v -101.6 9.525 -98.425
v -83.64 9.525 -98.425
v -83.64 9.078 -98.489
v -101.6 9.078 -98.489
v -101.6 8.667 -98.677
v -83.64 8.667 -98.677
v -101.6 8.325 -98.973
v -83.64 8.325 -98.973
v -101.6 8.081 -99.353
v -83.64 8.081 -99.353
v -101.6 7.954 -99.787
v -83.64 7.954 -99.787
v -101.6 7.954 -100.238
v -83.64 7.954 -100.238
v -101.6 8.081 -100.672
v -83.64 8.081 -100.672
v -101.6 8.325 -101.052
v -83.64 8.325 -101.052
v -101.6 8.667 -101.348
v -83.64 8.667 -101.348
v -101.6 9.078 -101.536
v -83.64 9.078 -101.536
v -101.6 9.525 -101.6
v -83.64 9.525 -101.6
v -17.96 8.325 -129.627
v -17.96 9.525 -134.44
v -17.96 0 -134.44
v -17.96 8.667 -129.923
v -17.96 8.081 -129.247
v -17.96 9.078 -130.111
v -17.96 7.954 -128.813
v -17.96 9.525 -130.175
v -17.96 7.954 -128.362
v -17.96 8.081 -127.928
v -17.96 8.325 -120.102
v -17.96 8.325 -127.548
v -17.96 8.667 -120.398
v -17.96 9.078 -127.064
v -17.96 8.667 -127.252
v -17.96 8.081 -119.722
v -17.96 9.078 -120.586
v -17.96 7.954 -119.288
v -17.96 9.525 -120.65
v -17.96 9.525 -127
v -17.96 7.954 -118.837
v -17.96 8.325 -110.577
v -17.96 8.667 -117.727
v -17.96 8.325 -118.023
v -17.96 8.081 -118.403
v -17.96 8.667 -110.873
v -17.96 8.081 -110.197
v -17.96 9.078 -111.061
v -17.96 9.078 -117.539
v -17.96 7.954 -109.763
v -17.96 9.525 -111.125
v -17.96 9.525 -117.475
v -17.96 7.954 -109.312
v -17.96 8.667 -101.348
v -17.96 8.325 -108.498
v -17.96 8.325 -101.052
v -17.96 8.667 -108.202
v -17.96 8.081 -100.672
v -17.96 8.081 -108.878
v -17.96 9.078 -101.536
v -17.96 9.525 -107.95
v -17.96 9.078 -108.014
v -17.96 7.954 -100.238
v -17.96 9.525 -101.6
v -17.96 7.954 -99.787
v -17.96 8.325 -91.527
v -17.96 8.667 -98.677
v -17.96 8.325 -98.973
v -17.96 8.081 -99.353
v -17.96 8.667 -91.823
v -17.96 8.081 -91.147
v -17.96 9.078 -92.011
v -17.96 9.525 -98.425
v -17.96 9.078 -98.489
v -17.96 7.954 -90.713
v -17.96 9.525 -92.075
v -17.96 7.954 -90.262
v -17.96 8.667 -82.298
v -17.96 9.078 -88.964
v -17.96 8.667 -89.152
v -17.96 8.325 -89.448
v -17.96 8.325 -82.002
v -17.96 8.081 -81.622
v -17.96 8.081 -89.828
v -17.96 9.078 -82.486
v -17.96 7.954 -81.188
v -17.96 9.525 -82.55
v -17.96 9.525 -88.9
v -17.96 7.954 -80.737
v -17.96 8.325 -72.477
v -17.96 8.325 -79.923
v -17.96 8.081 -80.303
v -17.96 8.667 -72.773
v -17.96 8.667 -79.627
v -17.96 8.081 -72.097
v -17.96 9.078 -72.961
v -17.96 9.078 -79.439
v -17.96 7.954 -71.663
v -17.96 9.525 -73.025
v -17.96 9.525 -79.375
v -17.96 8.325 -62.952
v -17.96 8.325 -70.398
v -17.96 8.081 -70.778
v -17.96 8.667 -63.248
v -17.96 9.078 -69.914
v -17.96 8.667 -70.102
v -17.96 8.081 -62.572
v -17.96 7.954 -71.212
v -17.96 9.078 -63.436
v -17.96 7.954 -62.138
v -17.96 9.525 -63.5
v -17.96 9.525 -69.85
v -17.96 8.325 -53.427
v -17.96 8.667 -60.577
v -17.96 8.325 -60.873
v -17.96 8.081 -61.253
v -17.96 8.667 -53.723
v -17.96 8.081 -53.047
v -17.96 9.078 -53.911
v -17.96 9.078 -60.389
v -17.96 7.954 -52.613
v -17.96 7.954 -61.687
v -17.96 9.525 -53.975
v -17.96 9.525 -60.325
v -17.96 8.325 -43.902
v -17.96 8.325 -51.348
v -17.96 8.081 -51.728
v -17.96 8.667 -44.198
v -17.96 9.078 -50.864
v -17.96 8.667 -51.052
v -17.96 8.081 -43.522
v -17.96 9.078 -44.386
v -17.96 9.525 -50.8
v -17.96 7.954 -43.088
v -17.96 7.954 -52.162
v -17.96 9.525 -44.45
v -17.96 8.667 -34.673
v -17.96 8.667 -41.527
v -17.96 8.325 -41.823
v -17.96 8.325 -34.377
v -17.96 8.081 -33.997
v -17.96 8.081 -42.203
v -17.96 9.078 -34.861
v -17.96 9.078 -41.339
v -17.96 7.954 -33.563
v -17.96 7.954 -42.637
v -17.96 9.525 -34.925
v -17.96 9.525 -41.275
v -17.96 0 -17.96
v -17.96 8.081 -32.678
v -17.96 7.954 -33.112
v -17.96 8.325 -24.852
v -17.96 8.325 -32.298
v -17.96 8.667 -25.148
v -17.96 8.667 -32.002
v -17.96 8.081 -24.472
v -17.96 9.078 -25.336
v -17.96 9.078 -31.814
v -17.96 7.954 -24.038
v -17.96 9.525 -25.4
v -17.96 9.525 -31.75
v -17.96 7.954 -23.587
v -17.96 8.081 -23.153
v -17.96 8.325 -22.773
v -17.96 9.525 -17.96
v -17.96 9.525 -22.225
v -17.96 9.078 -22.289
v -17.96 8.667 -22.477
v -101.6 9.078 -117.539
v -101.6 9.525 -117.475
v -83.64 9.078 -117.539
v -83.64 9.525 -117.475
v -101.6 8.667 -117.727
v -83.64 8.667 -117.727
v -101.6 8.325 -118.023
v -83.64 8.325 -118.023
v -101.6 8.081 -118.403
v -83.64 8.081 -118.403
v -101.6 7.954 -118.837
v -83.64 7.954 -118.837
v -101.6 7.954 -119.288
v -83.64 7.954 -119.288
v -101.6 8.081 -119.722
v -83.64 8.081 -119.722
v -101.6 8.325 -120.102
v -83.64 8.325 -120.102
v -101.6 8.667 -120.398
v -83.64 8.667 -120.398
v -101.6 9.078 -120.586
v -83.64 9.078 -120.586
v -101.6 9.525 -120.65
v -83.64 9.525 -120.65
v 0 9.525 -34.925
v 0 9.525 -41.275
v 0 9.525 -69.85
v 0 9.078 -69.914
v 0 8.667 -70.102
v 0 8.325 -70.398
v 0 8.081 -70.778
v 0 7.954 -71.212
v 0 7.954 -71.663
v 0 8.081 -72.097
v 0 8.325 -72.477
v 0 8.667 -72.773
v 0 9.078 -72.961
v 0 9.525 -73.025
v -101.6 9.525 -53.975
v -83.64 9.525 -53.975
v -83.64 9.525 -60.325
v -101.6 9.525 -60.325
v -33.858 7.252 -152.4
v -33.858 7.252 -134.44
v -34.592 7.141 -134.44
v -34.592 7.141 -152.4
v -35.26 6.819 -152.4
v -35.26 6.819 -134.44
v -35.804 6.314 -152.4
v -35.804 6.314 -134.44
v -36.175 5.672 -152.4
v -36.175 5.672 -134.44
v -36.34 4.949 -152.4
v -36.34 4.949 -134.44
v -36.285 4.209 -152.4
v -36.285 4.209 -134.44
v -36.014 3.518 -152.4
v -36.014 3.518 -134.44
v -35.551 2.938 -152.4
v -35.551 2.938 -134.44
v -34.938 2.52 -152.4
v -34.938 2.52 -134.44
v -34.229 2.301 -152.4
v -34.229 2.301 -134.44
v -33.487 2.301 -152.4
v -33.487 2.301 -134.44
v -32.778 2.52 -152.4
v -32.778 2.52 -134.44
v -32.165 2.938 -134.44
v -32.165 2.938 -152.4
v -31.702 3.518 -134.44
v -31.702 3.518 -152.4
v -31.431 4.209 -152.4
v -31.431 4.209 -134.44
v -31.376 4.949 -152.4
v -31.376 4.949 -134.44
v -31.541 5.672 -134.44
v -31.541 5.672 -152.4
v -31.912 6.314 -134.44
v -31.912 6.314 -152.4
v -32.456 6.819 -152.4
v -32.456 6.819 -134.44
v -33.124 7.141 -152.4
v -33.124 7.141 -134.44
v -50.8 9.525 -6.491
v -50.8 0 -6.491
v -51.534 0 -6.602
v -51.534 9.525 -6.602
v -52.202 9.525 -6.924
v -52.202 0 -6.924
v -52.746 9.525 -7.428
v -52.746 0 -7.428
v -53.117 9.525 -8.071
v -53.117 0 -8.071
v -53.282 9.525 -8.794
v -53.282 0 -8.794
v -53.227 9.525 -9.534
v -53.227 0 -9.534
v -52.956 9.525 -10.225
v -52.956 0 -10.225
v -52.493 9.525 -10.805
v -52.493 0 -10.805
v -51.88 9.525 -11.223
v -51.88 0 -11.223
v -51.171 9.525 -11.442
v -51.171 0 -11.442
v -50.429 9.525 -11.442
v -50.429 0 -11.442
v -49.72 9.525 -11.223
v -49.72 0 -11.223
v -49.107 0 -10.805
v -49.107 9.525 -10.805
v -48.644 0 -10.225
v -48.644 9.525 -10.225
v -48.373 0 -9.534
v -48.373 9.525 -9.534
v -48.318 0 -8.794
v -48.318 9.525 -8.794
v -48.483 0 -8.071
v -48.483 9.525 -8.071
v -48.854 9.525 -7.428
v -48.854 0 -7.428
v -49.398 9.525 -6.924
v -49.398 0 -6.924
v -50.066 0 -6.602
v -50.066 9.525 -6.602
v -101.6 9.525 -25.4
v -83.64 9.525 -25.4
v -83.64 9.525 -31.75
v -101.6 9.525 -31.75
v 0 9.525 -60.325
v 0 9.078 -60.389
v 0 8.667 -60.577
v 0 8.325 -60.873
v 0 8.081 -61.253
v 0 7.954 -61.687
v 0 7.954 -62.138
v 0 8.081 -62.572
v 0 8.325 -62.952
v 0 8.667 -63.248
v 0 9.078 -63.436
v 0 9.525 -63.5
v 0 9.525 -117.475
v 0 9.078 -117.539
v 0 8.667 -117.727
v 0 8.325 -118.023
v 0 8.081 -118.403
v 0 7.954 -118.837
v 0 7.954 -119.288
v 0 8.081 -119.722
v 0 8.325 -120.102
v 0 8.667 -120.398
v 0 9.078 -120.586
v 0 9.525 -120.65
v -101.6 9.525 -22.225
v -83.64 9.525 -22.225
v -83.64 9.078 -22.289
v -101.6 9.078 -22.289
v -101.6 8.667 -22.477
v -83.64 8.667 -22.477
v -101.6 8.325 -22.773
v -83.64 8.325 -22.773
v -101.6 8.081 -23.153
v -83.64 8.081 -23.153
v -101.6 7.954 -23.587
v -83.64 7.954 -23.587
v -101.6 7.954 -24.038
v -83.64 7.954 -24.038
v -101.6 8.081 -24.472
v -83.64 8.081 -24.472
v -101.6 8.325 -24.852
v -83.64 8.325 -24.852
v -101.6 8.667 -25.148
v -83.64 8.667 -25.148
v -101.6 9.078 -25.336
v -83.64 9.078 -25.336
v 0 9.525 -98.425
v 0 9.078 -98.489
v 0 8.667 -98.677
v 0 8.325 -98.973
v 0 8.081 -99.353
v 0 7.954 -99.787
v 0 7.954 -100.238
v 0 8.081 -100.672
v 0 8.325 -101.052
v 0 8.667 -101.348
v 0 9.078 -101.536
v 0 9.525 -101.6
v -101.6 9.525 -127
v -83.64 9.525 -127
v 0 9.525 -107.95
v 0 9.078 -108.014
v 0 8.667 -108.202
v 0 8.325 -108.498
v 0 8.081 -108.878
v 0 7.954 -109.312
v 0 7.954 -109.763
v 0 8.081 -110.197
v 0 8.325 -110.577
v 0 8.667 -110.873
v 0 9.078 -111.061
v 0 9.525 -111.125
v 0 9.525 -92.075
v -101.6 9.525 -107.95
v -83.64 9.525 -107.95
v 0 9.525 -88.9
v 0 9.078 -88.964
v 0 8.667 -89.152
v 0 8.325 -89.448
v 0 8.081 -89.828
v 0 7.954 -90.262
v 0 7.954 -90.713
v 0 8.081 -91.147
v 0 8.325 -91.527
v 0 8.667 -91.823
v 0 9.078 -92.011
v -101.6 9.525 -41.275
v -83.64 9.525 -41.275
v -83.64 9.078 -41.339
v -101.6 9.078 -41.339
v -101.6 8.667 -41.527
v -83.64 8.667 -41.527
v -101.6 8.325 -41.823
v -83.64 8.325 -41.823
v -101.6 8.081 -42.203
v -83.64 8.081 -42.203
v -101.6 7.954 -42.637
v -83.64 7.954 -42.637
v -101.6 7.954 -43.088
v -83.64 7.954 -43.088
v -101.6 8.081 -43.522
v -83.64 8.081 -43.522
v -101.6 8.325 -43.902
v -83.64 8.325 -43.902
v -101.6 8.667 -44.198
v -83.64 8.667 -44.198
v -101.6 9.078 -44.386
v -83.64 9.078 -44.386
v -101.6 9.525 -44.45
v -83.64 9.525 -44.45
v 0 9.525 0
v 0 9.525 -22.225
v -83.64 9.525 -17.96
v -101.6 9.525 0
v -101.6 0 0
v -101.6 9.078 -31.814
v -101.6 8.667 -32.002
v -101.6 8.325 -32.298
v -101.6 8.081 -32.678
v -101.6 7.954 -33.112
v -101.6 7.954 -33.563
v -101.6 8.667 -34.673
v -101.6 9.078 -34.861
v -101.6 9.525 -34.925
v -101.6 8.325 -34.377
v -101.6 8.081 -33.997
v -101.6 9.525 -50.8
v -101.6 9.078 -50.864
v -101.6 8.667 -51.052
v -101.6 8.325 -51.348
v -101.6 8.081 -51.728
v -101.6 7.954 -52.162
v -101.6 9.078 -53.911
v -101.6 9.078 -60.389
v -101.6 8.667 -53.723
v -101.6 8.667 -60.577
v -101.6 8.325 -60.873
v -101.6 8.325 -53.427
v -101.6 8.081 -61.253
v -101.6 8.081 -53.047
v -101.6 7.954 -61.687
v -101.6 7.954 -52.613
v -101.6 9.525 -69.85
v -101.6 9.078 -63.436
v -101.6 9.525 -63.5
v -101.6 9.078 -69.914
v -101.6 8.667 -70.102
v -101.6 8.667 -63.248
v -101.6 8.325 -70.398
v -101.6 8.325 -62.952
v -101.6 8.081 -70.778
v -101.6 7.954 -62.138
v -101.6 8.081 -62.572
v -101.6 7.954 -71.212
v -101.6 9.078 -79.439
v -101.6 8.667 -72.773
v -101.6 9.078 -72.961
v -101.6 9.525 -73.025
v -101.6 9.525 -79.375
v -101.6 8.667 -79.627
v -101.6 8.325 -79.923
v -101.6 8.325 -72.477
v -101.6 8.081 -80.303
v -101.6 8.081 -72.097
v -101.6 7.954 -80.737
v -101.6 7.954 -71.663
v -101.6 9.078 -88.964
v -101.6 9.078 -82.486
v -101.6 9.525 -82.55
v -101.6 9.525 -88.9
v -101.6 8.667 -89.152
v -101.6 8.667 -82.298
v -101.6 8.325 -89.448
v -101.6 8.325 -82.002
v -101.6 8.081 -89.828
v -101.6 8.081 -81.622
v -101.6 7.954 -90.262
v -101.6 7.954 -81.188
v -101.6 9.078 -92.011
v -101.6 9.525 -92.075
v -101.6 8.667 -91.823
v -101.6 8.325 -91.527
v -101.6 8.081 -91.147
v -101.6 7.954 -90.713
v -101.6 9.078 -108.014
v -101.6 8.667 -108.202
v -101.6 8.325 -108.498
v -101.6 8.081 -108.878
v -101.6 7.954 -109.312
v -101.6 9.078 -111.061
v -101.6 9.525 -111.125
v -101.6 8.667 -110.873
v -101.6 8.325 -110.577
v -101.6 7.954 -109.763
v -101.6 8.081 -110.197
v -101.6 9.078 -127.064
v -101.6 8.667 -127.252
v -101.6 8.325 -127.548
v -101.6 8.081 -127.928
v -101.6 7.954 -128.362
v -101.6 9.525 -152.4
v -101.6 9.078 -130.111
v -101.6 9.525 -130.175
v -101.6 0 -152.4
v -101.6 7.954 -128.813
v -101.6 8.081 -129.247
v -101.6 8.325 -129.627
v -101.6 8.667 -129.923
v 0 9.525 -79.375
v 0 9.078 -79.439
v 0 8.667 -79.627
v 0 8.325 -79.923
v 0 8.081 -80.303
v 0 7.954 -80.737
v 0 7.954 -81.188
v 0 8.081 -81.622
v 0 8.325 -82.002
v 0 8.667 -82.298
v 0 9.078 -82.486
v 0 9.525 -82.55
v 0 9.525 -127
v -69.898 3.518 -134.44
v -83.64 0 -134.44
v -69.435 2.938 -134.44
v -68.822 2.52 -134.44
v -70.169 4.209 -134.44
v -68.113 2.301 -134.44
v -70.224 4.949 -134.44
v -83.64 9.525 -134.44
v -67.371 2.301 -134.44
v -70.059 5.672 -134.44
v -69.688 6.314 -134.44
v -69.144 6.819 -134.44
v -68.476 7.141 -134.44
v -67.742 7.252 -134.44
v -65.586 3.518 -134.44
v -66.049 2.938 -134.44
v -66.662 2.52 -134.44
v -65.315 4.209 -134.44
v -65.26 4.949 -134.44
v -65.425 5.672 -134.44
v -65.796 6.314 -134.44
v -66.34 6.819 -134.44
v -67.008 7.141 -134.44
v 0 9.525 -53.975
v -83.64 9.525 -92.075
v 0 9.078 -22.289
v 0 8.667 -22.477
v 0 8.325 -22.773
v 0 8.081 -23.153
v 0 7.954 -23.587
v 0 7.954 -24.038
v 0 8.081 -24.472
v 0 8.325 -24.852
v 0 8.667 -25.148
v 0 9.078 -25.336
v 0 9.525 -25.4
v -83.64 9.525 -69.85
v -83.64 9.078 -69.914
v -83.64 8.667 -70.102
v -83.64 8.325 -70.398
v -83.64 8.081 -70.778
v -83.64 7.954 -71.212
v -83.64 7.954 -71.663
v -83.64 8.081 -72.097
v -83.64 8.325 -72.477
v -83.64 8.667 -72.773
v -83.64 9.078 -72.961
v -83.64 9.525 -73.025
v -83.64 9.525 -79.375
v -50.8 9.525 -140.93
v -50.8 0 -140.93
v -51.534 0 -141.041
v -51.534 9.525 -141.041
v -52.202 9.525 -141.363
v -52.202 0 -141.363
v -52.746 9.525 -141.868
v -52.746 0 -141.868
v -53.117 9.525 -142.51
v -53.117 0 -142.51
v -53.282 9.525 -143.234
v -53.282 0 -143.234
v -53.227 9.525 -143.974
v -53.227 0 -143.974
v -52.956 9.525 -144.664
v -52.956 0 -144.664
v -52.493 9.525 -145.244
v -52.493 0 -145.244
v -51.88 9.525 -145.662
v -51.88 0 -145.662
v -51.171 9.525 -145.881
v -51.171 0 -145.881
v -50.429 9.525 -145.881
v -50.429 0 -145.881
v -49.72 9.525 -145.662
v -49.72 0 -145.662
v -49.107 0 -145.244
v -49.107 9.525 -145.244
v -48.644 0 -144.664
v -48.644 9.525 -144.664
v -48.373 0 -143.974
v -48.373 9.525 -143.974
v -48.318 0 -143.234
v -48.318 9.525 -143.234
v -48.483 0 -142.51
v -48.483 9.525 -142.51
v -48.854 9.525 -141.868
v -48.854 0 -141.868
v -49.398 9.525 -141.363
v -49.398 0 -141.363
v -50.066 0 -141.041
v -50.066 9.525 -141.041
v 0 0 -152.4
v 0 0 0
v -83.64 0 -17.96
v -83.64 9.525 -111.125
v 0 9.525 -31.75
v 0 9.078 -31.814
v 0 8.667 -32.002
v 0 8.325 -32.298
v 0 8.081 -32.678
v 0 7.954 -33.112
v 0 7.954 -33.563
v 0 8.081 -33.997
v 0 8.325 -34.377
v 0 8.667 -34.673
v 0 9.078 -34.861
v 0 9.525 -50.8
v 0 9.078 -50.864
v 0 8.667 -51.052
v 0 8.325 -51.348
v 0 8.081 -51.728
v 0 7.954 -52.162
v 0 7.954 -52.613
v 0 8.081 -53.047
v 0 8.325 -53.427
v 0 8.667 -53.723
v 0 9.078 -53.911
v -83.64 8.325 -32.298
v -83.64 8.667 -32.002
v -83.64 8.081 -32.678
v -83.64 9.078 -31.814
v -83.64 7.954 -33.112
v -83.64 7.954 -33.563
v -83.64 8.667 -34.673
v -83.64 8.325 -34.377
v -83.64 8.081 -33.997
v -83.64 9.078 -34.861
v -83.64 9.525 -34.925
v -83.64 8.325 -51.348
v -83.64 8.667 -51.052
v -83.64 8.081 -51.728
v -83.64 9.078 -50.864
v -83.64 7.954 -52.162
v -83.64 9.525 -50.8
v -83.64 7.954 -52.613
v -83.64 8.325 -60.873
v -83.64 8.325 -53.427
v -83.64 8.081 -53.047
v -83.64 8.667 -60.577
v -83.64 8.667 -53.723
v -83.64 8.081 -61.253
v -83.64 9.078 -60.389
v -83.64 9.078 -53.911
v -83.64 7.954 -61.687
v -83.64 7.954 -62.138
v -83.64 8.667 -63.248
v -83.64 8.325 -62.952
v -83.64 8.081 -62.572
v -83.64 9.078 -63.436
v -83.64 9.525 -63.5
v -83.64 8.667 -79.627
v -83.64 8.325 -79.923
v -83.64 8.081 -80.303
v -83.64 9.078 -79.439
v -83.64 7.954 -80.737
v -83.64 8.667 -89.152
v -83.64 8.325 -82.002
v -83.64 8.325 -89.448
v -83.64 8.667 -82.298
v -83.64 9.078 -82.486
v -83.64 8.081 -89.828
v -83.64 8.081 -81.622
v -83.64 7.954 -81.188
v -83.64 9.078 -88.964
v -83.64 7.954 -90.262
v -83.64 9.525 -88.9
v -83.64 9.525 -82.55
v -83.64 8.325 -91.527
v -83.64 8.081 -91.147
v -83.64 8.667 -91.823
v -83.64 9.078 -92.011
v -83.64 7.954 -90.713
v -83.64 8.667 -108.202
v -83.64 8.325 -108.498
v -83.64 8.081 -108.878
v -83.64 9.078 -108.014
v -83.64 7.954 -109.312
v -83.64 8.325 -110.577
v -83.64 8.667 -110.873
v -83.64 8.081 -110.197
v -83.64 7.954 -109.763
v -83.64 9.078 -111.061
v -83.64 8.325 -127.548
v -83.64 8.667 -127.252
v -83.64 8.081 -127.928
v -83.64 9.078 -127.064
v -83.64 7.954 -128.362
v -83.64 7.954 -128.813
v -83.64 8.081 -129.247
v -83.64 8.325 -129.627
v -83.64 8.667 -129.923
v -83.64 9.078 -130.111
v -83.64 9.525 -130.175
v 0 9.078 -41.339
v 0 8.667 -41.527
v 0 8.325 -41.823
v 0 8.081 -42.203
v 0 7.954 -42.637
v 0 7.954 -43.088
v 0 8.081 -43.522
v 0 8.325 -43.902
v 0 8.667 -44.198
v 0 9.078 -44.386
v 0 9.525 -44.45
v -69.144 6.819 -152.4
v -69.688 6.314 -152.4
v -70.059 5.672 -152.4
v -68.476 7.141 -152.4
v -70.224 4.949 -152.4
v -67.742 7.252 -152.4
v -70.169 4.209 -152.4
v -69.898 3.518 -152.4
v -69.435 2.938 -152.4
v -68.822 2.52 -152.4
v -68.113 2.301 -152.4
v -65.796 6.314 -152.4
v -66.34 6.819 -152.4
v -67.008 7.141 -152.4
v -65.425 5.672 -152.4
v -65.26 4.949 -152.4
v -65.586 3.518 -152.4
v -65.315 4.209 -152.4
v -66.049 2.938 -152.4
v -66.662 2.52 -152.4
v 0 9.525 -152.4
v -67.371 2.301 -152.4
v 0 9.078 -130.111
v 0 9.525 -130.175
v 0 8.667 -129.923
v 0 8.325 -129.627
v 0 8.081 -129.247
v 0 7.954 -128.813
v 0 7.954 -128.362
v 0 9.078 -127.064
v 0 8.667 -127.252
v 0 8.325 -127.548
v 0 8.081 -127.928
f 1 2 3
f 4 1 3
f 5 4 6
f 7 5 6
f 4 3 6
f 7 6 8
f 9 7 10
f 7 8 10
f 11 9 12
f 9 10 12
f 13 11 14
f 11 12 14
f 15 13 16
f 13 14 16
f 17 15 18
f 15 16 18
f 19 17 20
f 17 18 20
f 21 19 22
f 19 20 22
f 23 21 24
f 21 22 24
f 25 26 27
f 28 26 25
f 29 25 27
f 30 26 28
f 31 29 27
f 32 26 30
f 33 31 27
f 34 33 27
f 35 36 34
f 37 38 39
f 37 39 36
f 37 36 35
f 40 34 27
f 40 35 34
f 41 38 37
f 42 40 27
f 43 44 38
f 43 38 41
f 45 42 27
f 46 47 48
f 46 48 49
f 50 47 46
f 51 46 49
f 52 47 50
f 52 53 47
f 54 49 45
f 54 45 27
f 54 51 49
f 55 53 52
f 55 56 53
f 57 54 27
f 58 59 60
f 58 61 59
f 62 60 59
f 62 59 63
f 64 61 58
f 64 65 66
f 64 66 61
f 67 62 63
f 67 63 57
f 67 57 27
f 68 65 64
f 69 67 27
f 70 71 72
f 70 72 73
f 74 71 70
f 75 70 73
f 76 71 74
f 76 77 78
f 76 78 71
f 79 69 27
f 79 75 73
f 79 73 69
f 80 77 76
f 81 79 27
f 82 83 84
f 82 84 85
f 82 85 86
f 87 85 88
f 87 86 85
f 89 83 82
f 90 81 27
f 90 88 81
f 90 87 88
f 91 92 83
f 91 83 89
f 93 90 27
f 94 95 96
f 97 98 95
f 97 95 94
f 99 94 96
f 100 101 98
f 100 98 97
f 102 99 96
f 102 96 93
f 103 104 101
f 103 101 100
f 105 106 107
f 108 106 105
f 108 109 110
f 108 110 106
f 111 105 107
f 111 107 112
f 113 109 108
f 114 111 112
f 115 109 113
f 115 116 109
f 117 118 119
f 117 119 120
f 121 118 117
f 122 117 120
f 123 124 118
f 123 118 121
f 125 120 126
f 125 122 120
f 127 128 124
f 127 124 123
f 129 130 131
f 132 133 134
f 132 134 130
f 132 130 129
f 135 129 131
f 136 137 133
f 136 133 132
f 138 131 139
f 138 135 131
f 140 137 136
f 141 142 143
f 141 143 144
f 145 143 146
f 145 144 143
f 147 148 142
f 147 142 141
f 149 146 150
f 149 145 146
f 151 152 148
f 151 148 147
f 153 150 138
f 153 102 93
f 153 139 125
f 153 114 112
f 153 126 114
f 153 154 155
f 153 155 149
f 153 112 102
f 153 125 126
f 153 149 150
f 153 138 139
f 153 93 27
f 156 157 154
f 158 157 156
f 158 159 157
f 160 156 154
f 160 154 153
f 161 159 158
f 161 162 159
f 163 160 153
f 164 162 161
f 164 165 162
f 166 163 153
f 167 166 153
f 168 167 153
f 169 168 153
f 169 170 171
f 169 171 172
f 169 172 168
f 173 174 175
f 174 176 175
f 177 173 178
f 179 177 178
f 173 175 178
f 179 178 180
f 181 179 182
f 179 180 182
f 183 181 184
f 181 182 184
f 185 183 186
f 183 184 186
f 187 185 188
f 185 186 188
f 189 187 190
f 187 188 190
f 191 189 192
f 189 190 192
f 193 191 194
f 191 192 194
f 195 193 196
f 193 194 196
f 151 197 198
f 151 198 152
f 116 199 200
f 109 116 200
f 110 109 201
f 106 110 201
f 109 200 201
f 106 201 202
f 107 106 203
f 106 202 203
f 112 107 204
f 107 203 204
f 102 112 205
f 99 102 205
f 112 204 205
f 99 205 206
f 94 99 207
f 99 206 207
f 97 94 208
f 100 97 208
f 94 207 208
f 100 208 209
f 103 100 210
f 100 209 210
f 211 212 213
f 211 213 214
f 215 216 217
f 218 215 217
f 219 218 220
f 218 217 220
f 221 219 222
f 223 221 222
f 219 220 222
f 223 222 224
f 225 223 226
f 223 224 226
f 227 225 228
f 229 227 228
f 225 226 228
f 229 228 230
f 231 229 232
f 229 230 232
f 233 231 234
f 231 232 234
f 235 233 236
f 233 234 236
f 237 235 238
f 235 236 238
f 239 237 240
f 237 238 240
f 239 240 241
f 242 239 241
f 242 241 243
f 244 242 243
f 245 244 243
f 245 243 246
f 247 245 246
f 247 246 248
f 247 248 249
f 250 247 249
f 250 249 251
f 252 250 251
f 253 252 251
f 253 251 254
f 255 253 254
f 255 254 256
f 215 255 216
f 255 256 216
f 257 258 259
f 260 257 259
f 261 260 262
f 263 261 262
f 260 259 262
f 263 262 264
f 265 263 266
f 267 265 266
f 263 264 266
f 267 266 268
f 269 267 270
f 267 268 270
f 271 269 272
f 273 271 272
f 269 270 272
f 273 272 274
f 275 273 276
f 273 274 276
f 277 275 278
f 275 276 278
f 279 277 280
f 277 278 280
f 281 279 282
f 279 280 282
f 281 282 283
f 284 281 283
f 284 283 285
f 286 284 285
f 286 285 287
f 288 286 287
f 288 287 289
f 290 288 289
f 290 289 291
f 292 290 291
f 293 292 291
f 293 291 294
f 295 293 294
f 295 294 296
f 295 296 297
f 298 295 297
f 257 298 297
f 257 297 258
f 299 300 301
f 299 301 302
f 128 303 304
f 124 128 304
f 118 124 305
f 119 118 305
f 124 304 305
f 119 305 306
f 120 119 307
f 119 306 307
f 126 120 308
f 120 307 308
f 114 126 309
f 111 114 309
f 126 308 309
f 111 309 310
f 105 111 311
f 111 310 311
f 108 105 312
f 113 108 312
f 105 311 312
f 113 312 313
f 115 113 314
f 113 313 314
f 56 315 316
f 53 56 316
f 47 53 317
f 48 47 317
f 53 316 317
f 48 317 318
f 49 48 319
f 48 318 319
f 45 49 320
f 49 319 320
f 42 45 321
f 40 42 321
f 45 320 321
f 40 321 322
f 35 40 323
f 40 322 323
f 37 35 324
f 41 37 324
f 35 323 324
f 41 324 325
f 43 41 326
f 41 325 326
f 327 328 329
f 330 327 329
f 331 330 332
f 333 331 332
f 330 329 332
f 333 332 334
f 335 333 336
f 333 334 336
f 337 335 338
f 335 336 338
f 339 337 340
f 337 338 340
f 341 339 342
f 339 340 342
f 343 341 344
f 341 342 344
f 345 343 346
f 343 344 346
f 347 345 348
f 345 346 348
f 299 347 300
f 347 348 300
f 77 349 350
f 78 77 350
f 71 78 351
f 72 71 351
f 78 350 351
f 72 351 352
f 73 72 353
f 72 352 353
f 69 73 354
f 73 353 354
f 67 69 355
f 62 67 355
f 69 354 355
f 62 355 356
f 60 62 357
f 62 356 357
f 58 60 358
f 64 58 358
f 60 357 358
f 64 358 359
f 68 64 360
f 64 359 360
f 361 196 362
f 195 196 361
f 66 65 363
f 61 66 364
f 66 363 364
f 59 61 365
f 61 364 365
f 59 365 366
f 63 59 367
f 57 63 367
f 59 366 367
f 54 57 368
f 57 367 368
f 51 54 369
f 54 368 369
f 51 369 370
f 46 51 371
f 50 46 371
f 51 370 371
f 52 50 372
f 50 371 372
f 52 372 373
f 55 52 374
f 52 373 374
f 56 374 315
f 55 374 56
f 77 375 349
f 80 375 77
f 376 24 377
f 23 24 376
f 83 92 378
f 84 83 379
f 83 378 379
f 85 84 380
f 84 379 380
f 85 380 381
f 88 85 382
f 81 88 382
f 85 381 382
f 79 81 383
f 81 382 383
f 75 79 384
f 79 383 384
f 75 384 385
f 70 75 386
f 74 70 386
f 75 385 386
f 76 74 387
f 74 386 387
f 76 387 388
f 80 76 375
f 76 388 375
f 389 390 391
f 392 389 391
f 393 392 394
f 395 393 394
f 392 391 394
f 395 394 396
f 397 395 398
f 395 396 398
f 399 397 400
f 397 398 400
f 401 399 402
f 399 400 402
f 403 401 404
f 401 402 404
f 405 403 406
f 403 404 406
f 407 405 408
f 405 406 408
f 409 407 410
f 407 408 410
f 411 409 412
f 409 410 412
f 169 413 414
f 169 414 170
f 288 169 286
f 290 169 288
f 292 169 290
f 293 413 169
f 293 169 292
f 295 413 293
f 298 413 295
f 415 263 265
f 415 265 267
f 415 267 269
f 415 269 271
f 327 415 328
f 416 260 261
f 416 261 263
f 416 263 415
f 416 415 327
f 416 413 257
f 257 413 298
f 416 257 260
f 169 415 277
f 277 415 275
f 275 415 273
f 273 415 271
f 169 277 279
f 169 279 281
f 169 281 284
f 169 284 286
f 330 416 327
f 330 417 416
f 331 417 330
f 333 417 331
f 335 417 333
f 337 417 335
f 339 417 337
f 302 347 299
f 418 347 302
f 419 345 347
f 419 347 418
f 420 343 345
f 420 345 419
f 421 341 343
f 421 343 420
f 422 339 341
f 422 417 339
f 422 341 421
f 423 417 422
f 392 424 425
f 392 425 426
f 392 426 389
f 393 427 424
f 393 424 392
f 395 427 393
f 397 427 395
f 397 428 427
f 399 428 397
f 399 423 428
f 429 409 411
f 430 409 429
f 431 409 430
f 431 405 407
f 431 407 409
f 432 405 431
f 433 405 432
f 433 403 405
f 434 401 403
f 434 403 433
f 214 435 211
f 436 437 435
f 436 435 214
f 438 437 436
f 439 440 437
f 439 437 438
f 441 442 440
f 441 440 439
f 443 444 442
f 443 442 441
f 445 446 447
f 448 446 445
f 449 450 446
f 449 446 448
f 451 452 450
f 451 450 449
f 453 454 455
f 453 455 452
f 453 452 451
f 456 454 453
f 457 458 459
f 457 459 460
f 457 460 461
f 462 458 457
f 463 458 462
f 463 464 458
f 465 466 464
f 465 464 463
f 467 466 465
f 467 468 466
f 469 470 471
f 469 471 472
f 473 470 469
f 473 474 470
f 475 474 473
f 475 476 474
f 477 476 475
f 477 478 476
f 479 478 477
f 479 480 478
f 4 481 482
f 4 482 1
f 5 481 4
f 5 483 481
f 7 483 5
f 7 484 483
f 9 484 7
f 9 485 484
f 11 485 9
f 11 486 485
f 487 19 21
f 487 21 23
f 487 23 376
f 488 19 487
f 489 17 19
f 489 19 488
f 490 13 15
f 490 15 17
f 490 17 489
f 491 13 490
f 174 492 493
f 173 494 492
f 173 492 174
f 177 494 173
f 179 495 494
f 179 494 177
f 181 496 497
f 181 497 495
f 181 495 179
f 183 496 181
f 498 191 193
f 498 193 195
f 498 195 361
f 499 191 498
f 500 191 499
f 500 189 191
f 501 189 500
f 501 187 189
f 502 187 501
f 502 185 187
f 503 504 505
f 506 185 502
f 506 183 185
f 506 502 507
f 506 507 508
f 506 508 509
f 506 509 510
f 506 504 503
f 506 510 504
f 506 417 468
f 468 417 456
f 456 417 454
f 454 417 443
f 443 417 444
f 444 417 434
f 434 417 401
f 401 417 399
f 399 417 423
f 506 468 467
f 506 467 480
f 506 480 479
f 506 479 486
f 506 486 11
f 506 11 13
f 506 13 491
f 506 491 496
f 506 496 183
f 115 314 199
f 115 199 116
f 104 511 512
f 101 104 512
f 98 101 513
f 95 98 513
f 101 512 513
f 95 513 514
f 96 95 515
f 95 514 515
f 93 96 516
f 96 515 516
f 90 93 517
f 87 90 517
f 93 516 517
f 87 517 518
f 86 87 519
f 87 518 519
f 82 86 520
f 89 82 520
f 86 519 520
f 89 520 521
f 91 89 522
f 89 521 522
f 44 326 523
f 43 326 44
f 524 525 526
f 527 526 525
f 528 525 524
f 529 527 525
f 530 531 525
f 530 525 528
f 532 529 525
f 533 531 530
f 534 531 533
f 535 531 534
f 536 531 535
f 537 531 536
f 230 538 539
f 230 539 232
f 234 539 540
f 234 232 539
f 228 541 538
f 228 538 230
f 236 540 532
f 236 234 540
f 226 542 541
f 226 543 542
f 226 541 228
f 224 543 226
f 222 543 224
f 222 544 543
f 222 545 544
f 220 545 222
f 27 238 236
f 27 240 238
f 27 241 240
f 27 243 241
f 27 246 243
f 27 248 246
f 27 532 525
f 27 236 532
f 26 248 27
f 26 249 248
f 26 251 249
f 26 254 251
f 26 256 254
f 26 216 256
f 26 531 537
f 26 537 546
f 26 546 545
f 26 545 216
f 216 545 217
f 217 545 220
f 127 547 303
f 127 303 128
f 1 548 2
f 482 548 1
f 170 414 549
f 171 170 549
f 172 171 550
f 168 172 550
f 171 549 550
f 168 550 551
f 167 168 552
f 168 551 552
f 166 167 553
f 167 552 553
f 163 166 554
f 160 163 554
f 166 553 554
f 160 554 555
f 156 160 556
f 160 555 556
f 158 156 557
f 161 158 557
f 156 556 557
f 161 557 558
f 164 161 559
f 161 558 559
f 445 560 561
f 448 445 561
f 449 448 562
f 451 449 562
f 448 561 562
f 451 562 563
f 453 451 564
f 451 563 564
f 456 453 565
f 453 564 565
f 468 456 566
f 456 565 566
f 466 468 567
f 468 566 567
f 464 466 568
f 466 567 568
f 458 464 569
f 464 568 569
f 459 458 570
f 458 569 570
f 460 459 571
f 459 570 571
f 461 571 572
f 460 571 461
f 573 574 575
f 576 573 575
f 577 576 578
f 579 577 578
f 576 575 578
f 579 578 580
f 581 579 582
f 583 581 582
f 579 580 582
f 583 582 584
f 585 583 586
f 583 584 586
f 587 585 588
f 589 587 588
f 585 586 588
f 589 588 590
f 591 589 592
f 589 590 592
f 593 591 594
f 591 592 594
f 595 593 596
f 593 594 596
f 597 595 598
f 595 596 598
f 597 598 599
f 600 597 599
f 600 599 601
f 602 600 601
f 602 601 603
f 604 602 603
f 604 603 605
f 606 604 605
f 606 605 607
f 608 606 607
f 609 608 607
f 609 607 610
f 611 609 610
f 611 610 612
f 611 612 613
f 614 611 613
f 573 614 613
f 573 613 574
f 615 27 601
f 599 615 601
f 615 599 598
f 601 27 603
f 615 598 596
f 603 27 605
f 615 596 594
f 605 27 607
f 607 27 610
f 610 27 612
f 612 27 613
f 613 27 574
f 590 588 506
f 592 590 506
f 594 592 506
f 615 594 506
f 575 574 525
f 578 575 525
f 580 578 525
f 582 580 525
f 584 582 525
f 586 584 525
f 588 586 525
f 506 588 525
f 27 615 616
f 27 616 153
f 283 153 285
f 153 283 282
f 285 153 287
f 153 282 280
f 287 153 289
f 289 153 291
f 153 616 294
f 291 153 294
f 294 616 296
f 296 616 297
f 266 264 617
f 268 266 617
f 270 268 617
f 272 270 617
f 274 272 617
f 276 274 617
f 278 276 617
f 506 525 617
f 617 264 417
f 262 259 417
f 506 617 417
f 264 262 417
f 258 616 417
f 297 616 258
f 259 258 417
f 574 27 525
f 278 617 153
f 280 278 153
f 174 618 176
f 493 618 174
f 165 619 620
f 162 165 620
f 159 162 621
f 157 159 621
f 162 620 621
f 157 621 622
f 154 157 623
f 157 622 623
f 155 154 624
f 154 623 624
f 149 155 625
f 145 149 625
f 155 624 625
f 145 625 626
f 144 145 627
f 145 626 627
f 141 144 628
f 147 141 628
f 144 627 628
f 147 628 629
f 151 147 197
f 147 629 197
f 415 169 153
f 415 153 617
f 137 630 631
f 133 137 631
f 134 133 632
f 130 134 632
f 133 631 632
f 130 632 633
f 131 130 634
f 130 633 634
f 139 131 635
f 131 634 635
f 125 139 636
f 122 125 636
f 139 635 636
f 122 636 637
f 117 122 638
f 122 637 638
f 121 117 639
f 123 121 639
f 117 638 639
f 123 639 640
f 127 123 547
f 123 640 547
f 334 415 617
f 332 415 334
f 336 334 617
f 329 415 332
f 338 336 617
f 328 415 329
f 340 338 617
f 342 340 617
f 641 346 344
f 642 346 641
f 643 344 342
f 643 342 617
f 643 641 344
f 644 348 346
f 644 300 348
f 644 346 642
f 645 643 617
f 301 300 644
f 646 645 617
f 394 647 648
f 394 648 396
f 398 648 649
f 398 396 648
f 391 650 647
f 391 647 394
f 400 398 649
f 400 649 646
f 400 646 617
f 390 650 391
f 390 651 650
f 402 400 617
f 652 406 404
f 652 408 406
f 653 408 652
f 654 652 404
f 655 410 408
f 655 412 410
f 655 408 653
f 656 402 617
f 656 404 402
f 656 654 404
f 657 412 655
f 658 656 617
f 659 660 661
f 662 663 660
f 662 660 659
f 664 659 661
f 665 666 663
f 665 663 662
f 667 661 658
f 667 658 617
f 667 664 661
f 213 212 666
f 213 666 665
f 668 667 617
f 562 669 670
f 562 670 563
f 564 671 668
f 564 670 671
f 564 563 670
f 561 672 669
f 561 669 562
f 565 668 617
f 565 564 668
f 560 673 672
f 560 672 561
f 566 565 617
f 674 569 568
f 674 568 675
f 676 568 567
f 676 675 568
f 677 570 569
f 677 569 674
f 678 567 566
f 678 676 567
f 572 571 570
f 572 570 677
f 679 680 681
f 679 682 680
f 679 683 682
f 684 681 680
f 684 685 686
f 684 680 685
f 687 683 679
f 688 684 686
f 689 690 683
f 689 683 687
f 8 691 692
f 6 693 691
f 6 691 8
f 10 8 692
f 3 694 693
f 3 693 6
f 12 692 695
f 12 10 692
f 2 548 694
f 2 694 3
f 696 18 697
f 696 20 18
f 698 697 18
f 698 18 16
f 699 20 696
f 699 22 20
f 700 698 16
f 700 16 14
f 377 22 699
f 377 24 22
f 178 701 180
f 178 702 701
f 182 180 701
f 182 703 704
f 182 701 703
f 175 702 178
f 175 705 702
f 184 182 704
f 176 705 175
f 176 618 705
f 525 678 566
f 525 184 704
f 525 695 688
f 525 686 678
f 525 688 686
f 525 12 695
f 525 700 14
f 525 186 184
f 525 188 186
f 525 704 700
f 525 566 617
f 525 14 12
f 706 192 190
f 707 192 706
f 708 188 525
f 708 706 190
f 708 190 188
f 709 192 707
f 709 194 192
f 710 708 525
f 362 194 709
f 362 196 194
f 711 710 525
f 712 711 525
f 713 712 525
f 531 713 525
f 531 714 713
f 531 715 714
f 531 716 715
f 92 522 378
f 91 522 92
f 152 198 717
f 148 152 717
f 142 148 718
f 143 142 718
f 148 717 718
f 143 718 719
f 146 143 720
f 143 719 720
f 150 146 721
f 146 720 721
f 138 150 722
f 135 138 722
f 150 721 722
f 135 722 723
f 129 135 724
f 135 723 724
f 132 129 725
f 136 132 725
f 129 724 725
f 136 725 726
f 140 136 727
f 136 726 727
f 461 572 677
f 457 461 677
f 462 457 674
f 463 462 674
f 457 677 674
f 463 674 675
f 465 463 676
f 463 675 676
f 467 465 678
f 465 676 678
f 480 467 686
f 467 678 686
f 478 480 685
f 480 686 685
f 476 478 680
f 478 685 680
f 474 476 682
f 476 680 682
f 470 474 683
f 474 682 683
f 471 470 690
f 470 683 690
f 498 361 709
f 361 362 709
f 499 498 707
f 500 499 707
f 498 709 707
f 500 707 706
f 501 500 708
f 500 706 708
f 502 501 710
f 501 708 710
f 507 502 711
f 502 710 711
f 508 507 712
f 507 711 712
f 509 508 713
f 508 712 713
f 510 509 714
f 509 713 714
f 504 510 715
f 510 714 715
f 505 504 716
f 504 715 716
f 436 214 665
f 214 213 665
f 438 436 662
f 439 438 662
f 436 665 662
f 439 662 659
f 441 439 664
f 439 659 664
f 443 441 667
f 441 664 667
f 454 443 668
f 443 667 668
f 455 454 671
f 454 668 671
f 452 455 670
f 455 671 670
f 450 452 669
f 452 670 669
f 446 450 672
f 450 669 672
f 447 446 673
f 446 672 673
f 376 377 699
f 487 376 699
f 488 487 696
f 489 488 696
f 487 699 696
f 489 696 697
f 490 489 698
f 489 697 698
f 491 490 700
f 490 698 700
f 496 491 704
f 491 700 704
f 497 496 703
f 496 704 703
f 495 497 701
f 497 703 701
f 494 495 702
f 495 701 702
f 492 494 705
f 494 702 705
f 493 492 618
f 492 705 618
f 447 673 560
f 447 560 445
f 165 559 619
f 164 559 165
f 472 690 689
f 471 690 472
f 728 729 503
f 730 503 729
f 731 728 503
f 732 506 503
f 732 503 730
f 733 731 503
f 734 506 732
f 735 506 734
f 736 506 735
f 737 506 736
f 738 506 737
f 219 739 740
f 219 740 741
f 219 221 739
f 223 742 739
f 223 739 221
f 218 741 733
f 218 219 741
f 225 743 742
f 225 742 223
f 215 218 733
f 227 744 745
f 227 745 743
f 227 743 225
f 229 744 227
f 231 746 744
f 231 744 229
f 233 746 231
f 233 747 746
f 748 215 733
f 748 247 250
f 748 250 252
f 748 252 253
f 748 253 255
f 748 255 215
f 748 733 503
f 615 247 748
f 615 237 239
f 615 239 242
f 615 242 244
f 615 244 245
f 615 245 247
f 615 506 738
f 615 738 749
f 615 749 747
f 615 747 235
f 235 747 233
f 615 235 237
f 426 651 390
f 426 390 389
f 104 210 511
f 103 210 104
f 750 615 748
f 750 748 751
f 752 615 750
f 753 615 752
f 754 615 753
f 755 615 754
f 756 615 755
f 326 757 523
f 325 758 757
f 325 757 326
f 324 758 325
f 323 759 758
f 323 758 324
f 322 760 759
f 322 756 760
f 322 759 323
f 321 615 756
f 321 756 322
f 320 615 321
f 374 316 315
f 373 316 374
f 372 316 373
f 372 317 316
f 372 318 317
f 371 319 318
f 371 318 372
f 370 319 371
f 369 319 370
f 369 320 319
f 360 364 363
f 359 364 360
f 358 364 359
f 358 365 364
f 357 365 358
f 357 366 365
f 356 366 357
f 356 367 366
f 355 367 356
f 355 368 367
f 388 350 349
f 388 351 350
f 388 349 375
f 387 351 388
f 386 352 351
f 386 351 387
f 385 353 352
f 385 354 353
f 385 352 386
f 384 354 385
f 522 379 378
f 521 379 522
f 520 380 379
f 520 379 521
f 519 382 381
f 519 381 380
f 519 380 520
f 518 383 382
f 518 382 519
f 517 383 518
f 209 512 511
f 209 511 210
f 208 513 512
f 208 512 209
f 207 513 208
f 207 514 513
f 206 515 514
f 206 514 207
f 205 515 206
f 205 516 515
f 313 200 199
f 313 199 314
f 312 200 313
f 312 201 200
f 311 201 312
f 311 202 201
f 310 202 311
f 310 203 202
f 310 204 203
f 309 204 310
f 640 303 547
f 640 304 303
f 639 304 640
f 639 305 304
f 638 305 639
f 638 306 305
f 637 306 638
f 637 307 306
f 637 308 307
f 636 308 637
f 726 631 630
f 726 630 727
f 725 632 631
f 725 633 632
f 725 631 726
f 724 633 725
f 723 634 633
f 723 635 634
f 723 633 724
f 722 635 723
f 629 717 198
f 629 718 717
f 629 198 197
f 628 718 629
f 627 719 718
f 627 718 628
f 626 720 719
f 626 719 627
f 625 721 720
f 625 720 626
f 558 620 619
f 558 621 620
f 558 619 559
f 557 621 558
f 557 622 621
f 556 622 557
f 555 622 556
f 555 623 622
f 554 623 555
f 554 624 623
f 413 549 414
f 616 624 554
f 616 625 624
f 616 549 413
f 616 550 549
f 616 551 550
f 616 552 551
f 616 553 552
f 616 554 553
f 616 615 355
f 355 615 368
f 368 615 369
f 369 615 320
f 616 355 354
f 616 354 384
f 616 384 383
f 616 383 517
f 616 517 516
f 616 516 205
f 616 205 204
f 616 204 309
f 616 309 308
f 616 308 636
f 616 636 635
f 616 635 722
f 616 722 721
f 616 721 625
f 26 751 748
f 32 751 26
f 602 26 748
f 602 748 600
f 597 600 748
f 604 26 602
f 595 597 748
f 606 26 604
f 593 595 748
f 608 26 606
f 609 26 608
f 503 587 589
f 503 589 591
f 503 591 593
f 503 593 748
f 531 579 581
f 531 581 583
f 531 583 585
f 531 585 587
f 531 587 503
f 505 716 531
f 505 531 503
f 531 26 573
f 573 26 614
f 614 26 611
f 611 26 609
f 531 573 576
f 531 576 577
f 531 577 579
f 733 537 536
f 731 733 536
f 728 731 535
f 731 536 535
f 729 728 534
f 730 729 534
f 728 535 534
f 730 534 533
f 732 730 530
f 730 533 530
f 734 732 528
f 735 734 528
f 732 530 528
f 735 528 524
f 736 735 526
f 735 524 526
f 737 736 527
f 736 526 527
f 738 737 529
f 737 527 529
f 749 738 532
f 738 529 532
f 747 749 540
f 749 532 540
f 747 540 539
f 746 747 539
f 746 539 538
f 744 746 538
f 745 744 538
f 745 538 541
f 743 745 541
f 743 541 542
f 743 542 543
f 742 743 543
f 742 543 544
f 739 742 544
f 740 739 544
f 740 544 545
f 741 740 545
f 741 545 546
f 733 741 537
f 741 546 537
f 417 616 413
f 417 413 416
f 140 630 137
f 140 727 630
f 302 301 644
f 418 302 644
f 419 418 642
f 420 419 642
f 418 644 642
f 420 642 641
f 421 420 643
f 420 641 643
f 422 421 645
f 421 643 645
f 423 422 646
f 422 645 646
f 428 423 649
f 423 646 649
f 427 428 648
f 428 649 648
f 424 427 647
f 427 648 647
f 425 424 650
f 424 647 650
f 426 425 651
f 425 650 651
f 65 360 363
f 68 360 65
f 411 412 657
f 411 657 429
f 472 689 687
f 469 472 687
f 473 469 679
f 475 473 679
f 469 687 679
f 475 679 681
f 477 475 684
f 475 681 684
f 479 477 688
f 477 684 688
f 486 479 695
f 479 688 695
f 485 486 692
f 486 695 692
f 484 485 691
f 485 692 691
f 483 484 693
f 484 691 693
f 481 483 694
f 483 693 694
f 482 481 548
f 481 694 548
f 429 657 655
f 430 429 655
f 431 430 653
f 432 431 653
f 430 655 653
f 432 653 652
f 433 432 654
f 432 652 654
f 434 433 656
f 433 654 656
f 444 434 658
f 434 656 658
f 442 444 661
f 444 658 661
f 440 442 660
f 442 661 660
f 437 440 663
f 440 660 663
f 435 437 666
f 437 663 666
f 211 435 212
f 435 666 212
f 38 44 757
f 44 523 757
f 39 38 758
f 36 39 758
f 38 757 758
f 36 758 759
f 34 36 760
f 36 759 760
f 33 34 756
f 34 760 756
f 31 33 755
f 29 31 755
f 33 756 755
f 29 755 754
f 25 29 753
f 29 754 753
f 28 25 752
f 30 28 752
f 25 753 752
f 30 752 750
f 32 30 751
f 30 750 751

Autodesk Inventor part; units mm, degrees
ref_plane "YZ Plane" through (0, 0, 0) normal (1, 0, 0) x (0, 1, 0)
ref_plane "XZ Plane" through (0, 0, 0) normal (0, 1, 0) x (-1, 0, 0)
ref_plane "XY Plane" through (0, 0, 0) normal (0, 0, 1) x (1, 0, 0)
sketch "Sketch1" plane through (0, 0, 0) normal (0, 1, 0) x (-1, 0, 0)
  line L0 (0, 0) -> (101.6, 0)
  line L1 (101.6, 0) -> (101.6, -152.4)
  line L2 (101.6, -152.4) -> (0, -152.4)
  line L3 (0, -152.4) -> (0, 0)
  dimension "d0" = 101.6
  dimension "d1" = 152.4
extrude "Extrusion1" add sketch "Sketch1" along normal blind 9.525
sketch "Sketch2" plane through (0, 9.525, 0) normal (0, 1, 0) x (1, 0, 0)
  line L0 (-101.6, 0) -> (0, 0) projected
  line L1 (0, 0) -> (-17.9605, 17.9605)
  line L2 (0, 0) -> (25.4, 0) construction
  line L3 (-101.6, 152.4) -> (-101.6, 0) projected
  line L4 (-101.6, 152.4) -> (-83.6395, 134.4395)
  line L5 (-17.9605, 17.9605) -> (-83.6395, 17.9605)
  line L6 (-83.6395, 17.9605) -> (-83.6395, 134.4395)
  line L7 (-83.6395, 134.4395) -> (-17.9605, 134.4395)
  line L8 (-17.9605, 134.4395) -> (-17.9605, 17.9605)
  dimension "d4" = 25.4
  dimension "d5" = 135
  dimension "d6" = 25.4
extrude "Extrusion2" cut sketch "Sketch2" against normal blind 9.525 contours L5 L6 L7 L8
sketch "Sketch3" plane through (0, 0, 0) normal (1, 0, 0) x (0, 0, -1)
  line L0 (0, 9.525) -> (152.4, 9.525) projected
  line L1 (0, 10.079) -> (25.4, 10.079) construction
  line L2 (0, 0) -> (0, 9.525) projected
  line L3 (0, 9.525) -> (23.8125, 9.525)
  line L4 (134.4395, 9.525) -> (17.9605, 9.525) projected
  circle A0 centre (23.8125, 9.525) radius 1.5875
  circle A1 centre (33.3375, 9.525) radius 1.5875
  circle A2 centre (42.8625, 9.525) radius 1.5875
  circle A3 centre (52.3875, 9.525) radius 1.5875
  circle A4 centre (61.9125, 9.525) radius 1.5875
  circle A5 centre (71.4375, 9.525) radius 1.5875
  circle A6 centre (80.9625, 9.525) radius 1.5875
  circle A7 centre (90.4875, 9.525) radius 1.5875
  circle A8 centre (100.0125, 9.525) radius 1.5875
  circle A9 centre (109.5375, 9.525) radius 1.5875
  circle A10 centre (119.0625, 9.525) radius 1.5875
  circle A11 centre (128.5875, 9.525) radius 1.5875
  point P0 (130.175, 9.525)
  point P1 (127, 9.525)
  point P2 (120.65, 9.525)
  point P3 (117.475, 9.525)
  point P4 (101.6, 9.525)
  point P5 (98.425, 9.525)
  point P6 (82.55, 9.525)
  point P7 (79.375, 9.525)
  point P8 (73.025, 9.525)
  point P9 (69.85, 9.525)
  point P10 (63.5, 9.525)
  point P11 (60.325, 9.525)
  point P12 (53.975, 9.525)
  point P13 (50.8, 9.525)
  point P14 (44.45, 9.525)
  point P15 (41.275, 9.525)
  point P16 (34.925, 9.525)
  point P17 (31.75, 9.525)
  point P18 (22.225, 9.525)
  point P19 (25.4, 9.525)
  dimension "d11" = 23.8125
  dimension "d12" = 3.175
  dimension "d15" = 9.525
extrude "Extrusion3" cut sketch "Sketch3" against normal blind 107.95 contours L0 A0 | L0 A11 | L0 A10 | A9 L0 | L0 A9 | L0 A8 | A7 L0 | L0 A7 | L0 A6 | L0 A5 | L0 A4 | L0 A3 | L0 A2 | L0 A1 picked at (24.8555, 9.3984) picked at (128.9035, 8.9629) picked at (119.4808, 8.612) picked at (100.4308, 8.612) picked at (81.3808, 8.612) picked at (71.8558, 8.612) picked at (61.501, 9.0475) picked at (52.5145, 8.7843) picked at (42.9895, 8.7843) picked at (33.5251, 8.5384)
sketch "Sketch4" plane through (0, 0, -152.4) normal (0, 0, -1) x (-1, 0, 0)
  line L0 (101.6, 0) -> (101.6, 9.525) projected
  line L1 (101.6, 4.7625) -> (67.7418, 4.7625)
  line L2 (0, 4.7625) -> (33.8582, 4.7625)
  line L3 (0, 4.7625) -> (33.8582, 4.7625) construction
  point P0 (0, 0)
  dimension "d22" = 33.8582
  dimension "d23" = 33.8582
  dimension "d24" = 0
hole "Hole1" at (-67.7418, 4.7625, -152.4) direction (0, 0, 1) diameter 4.9784 depth 25.4 thread size "1/4-20 UNC" class "2B" standard "ANSI Unified Screw Threads"
hole "Hole2" at (-33.8582, 4.7625, -152.4) direction (0, 0, 1) diameter 4.9784 depth 25.4 thread size "1/4-20 UNC" class "2B" standard "ANSI Unified Screw Threads"
sketch "Sketch5" plane through (0, 9.525, 0) normal (0, 1, 0) x (1, 0, 0)
  line L0 (-101.6, 0) -> (0, 0) projected
  line L1 (-50.8, 0) -> (-50.8, 17.9605)
  line L2 (-83.6395, 17.9605) -> (-17.9605, 17.9605) projected
  line L3 (-50.8, 0) -> (-50.8, 8.9803)
sketch "Sketch6" plane through (0, 9.525, 0) normal (0, 1, 0) x (1, 0, 0)
  line L0 (-17.9605, 134.4395) -> (-83.6395, 134.4395) projected
  line L1 (-50.8, 134.4395) -> (-50.8, 152.4)
  line L2 (0, 152.4) -> (-101.6, 152.4) projected
  line L3 (-50.8, 134.4395) -> (-50.8, 143.4197)
  point P0 (0, 0)
hole "Hole3" at (-50.8, 9.525, -8.9803) direction (0, -1, 0) diameter 4.9784 depth 25.4 thread size "1/4-20 UNC" class "2B" standard "ANSI Unified Screw Threads"
hole "Hole4" at (-50.8, 9.525, -143.4197) direction (0, -1, 0) diameter 4.9784 depth 25.4 thread size "1/4-20 UNC" class "2B" standard "ANSI Unified Screw Threads"
properties part number "side-A"
